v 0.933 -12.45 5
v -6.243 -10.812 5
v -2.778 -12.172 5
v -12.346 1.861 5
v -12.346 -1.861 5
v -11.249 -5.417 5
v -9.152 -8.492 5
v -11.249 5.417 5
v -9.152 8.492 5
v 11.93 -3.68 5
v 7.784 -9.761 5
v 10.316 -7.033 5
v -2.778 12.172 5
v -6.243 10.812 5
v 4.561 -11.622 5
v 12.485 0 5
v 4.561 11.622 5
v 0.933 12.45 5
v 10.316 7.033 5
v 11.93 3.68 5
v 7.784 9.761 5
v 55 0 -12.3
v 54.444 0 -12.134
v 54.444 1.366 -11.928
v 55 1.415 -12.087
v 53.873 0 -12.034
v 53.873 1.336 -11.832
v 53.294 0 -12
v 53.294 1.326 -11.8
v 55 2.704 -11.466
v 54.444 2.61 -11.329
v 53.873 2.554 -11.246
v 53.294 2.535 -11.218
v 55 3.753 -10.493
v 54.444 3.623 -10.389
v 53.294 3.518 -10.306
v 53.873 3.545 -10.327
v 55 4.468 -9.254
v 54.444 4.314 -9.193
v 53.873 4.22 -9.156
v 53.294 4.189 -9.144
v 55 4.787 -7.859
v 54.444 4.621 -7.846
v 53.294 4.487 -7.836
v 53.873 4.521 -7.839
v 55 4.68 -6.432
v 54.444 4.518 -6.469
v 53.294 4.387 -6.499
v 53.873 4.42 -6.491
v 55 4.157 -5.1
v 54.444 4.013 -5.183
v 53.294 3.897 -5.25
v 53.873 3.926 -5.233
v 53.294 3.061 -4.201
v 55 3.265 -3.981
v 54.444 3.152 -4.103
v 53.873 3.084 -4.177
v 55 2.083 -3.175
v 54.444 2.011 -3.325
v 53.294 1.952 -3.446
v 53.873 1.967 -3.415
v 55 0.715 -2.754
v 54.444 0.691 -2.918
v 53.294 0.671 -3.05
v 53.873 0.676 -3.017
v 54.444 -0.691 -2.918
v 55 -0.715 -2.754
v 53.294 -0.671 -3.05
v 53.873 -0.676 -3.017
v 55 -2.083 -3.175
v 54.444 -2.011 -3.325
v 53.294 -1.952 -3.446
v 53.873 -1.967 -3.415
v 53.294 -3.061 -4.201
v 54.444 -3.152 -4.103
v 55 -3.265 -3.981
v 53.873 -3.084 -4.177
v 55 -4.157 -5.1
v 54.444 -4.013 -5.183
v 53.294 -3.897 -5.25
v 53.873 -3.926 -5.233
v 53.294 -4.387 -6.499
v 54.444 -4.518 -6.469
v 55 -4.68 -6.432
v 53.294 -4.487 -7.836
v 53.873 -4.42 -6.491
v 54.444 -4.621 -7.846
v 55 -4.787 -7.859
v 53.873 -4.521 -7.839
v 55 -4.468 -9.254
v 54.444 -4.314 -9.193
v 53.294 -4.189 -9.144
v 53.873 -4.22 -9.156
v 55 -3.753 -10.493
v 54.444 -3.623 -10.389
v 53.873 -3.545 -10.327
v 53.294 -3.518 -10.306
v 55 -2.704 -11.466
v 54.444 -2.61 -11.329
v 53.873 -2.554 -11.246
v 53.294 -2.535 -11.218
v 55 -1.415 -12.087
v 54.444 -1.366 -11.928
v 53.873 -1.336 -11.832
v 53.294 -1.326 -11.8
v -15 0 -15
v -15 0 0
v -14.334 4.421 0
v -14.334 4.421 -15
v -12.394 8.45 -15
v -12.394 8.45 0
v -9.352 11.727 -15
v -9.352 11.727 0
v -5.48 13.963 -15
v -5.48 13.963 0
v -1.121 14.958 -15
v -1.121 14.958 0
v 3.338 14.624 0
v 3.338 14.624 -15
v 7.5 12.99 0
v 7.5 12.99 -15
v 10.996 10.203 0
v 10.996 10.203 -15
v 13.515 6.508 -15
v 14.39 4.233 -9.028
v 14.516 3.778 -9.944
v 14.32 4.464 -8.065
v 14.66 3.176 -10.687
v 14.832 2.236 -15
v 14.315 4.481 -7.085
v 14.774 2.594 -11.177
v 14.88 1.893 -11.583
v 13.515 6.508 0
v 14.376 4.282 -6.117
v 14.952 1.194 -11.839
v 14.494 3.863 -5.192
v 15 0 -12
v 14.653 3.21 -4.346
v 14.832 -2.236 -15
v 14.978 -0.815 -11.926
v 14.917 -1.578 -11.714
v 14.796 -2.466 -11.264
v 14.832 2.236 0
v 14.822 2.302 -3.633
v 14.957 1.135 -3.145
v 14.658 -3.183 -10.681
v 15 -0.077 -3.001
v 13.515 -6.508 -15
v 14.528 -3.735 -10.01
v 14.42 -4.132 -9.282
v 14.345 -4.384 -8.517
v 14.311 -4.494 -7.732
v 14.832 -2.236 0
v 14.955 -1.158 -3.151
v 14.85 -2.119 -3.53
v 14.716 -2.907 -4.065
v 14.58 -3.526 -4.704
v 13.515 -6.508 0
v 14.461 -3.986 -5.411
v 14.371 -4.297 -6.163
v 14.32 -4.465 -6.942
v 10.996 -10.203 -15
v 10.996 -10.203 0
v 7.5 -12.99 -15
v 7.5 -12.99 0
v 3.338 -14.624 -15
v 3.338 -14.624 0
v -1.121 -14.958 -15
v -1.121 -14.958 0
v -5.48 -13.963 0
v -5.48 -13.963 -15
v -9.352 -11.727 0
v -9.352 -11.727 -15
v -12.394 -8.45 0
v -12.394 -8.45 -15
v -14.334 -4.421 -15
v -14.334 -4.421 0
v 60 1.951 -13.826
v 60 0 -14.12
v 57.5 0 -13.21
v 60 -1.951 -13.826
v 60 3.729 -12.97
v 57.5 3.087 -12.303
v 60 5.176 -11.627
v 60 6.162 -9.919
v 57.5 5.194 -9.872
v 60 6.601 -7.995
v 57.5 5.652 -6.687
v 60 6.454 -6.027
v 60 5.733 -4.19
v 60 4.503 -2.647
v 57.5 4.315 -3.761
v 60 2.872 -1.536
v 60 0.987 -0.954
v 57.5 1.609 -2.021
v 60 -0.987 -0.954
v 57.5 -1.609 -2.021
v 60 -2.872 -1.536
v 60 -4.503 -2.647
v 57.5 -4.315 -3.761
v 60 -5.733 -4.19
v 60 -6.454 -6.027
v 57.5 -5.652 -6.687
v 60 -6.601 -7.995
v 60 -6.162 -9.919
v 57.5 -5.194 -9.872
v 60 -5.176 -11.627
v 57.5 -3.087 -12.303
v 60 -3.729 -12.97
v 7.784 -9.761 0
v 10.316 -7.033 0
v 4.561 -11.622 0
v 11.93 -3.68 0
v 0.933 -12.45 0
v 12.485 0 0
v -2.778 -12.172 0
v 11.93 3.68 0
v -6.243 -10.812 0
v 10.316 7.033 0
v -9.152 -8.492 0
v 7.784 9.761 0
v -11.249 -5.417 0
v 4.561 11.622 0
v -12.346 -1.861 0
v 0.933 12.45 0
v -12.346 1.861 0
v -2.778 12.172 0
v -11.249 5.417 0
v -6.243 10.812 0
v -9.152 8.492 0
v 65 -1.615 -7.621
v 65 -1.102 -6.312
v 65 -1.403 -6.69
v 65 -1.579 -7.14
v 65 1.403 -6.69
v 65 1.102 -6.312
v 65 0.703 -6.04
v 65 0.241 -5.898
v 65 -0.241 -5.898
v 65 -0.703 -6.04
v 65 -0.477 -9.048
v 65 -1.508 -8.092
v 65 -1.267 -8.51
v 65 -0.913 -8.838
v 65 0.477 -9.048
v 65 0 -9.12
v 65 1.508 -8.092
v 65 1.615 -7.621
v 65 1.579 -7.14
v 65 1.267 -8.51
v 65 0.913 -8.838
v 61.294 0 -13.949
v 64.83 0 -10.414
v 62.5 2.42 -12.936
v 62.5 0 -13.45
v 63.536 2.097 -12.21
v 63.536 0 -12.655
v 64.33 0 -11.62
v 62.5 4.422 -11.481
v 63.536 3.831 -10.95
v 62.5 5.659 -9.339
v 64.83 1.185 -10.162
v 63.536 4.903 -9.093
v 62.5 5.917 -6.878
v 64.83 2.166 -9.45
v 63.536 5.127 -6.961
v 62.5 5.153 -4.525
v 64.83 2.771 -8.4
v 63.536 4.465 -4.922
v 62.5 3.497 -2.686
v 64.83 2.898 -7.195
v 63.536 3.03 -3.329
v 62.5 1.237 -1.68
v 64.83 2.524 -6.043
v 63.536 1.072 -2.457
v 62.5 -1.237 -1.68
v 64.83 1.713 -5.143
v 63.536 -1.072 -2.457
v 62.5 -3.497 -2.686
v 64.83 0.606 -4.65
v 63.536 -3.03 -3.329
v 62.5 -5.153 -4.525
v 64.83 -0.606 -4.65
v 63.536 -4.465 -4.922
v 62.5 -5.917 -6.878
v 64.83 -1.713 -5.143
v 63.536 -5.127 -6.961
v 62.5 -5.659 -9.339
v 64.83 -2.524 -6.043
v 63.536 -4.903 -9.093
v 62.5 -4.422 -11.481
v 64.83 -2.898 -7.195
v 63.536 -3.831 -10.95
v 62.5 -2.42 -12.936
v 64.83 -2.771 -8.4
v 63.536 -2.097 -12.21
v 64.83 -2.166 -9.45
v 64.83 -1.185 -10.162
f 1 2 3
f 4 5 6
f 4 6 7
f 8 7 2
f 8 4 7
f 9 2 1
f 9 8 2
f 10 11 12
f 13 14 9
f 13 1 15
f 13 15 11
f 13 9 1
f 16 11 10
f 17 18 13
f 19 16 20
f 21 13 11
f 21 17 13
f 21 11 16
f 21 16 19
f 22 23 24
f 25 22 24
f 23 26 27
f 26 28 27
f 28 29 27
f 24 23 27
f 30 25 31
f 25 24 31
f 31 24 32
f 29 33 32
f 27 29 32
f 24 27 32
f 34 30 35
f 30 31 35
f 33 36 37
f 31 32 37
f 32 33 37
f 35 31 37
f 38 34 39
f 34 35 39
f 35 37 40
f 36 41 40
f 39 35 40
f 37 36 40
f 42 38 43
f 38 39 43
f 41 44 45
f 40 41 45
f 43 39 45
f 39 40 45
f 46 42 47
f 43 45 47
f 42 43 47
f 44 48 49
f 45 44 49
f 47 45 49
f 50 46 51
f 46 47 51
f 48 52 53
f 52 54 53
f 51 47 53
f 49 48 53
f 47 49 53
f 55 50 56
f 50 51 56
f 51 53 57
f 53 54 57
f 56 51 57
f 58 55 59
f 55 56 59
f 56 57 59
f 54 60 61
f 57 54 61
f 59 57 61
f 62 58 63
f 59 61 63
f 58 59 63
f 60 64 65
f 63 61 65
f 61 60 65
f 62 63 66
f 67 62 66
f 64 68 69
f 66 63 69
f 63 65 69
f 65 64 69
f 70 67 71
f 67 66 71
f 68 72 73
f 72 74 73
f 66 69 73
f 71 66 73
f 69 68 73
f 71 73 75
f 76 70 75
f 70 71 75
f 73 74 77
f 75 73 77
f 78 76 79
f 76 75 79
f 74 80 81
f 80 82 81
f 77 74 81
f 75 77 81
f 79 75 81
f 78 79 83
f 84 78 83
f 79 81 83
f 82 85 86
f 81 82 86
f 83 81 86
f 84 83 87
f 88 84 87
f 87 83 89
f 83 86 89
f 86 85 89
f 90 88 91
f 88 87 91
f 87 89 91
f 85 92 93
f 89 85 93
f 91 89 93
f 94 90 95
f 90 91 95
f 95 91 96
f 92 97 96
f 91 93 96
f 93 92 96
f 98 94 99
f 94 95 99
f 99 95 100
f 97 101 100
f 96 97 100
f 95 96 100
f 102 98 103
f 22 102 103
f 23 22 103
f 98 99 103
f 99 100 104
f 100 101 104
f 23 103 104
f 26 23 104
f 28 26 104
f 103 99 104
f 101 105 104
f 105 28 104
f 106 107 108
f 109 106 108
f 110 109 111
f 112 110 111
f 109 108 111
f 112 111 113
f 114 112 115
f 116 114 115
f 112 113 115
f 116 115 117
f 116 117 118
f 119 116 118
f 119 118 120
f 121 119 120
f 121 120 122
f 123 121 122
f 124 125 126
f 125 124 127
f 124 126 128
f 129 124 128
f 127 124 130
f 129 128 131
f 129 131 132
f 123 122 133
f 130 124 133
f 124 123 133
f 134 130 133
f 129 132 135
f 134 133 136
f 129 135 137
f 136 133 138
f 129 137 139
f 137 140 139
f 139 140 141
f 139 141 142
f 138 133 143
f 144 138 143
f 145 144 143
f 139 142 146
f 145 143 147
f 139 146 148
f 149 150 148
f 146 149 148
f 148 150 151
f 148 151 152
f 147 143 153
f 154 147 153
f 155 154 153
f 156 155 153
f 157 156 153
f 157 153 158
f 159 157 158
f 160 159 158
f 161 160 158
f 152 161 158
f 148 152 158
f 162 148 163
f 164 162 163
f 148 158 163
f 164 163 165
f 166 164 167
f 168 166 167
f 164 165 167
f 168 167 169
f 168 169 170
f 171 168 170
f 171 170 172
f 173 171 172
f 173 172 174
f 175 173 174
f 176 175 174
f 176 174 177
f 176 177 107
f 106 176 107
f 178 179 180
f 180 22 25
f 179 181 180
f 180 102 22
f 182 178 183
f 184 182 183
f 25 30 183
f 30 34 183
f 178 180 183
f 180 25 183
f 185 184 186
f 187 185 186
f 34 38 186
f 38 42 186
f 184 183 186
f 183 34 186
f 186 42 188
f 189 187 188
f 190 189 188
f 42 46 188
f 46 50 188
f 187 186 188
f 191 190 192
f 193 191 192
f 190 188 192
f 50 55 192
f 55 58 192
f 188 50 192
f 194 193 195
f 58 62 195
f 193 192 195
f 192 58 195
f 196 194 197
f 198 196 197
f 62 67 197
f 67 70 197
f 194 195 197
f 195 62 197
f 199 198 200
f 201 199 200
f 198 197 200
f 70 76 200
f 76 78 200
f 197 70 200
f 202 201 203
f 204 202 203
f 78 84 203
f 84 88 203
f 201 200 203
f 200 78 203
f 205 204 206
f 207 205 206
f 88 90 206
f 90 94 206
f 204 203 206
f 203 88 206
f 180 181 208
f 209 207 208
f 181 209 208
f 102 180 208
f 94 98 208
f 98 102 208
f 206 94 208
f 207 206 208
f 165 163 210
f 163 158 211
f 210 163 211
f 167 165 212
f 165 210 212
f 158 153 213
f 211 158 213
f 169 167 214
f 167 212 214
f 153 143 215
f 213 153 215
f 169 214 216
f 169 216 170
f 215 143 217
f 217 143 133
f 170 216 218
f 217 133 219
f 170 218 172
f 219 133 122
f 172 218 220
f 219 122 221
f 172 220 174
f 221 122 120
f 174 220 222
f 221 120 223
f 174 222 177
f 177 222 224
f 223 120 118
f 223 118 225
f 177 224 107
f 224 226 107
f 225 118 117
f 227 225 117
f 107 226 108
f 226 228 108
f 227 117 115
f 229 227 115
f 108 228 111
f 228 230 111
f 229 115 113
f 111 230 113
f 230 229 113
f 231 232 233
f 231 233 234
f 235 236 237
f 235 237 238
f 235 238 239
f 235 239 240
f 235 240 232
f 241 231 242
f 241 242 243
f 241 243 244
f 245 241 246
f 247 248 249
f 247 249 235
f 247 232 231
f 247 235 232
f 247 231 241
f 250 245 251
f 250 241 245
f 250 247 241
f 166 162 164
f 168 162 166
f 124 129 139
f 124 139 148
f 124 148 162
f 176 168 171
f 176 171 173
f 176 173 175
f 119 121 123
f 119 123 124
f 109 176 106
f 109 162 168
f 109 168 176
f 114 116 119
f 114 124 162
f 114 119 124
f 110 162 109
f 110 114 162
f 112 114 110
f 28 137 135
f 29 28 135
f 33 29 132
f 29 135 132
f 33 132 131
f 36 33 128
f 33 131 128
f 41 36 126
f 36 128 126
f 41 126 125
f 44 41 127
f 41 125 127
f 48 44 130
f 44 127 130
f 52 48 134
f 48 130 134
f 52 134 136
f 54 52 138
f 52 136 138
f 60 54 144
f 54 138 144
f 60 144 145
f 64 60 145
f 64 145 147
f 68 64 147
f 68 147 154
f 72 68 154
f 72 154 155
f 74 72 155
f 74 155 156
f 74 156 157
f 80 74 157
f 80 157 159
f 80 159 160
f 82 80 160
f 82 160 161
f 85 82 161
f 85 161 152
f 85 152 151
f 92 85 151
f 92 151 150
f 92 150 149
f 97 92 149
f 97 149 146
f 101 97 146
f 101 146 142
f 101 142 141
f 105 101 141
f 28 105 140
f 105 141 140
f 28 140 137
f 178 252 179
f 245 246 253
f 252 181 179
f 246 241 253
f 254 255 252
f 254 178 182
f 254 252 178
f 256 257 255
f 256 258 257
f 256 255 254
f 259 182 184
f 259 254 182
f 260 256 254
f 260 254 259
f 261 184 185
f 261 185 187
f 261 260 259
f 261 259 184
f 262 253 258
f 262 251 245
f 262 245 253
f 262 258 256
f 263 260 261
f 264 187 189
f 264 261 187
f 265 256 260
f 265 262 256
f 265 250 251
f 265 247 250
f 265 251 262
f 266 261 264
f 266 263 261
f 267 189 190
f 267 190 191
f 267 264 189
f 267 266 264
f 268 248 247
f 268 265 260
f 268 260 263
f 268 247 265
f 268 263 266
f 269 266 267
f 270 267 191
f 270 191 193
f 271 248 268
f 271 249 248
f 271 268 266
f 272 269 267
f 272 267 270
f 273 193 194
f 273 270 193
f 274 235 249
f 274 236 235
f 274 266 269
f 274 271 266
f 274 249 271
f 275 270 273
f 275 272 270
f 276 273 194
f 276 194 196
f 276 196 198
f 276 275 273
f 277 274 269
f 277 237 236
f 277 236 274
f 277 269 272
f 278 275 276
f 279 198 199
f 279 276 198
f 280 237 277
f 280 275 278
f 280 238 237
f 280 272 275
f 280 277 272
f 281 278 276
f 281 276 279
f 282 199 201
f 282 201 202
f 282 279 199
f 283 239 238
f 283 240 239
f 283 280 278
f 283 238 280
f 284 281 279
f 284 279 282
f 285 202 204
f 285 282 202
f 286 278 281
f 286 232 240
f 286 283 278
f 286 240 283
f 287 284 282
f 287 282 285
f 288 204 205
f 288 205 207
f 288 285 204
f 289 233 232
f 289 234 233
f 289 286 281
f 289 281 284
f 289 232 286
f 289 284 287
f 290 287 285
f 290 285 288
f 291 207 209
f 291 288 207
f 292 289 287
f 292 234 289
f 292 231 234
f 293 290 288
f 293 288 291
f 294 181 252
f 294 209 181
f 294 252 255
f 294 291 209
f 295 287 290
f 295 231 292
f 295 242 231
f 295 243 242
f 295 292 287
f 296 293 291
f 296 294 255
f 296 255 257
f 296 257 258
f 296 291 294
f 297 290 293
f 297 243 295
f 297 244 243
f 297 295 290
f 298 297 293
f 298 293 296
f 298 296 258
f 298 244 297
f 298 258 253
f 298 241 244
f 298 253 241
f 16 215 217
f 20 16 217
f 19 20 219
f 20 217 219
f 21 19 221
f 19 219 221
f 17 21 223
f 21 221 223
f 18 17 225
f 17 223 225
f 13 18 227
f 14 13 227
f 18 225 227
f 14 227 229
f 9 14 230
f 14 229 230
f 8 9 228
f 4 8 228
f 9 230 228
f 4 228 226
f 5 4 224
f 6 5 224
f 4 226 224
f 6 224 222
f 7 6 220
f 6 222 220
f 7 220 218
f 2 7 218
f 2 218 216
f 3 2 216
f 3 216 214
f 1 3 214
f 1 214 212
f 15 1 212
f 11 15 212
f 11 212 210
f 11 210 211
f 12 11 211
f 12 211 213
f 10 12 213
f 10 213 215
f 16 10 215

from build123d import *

# Parameters (mm, degrees)
SKETCH1_R           = 12.485
BOSS_EXTRUDE1_DEPTH = 20
SKETCH2_R           = 15
BOSS_EXTRUDE2_DEPTH = 15
SKETCH3_R           = 4.5
BOSS_EXTRUDE3_DEPTH = 55
SKETCH4_R           = 4.8
BOSS_EXTRUDE4_DEPTH = 5
BOSS_EXTRUDE4_DRAFT = -20
SKETCH5_R           = 6.619851171
BOSS_EXTRUDE6_DEPTH = 5
FILLET1_R           = 5
FILLET2_R           = 5
CUT_EXTRUDE2_START  = -15
SKETCH6_R           = 12.485
CUT_EXTRUDE2_DEPTH  = 15


# Some blends are built 0.0001 mm under size
with BuildPart() as part:
    # Sketch1 → Boss-Extrude1 (new body)
    with BuildSketch(Plane.XY):
        Circle(SKETCH1_R)
    extrude(amount=BOSS_EXTRUDE1_DEPTH)

    # Sketch2 → Boss-Extrude2 (add)
    with BuildSketch(Plane(origin=(0, 0, 0), x_dir=(-1, 0, 0), z_dir=(0, 0, -1))):
        Circle(SKETCH2_R)
    extrude(amount=BOSS_EXTRUDE2_DEPTH)

    # Sketch3 → Boss-Extrude3 (add)
    with BuildSketch(Plane(origin=(0, 0, 0), x_dir=(0, 0, -1), z_dir=(1, 0, 0))):
        with Locations((7.5, 0)):
            Circle(SKETCH3_R)
    extrude(amount=BOSS_EXTRUDE3_DEPTH)


with BuildPart() as boss_extrude4_tool:
    # Sketch4 → Boss-Extrude4 (with draft: the straight prism first)
    with BuildSketch(Plane(origin=(55, 0, 0), x_dir=(0, 0, -1), z_dir=(1, 0, 0))):
        with Locations((7.5, 0)):
            Circle(SKETCH4_R)
    extrude(amount=BOSS_EXTRUDE4_DEPTH)
    # Boss-Extrude4: the draft: its side faces are tilted about the plane it starts from
    boss_extrude4_sides = [boss_extrude4_tool.faces().sort_by_distance(p)[0] for p in [
        (57.5, 0, -2.7),
    ]]
    draft(boss_extrude4_sides, Plane(origin=(55, 0, 0), x_dir=(0, 0, -1), z_dir=(1, 0, 0)), BOSS_EXTRUDE4_DRAFT)


with BuildPart() as part_1:
    add(part.part)

    # Boss-Extrude4: add boss_extrude4_tool
    add(boss_extrude4_tool.part)

    # Sketch5 → Boss-Extrude6 (add)
    with BuildSketch(Plane(origin=(60, 0, 0), x_dir=(0, 0, -1), z_dir=(1, 0, 0))):
        with Locations((7.5, 0)):
            Circle(SKETCH5_R)
    extrude(amount=BOSS_EXTRUDE6_DEPTH)

    # Fillet1
    fillet1_edges = [part_1.edges().sort_by_distance(p)[0] for p in [
        (65, 0, -0.880148829),
    ]]
    fillet(fillet1_edges, radius=FILLET1_R - 0.0001)  # a hair under: the kernel refuses the full size

    # Fillet2
    # the kernel refuses this fillet: 5 mm, written as the material it adds along each edge
    with BuildSketch(Plane(origin=(55, 0, -7.5), x_dir=(0, 0, -1), z_dir=(0, -1, 0))) as fillet2_piece_1:
        with BuildLine():
            CenterArc((9.5, -1.705872211), FILLET2_R, 160.051556411, 19.948443589)
            Line((4.5, -1.705872211), (4.4, -1.705872211))
            Line((4.4, -1.705872211), (4.4, 0))
            Line((4.4, 0), (4.5, 0.1))
            ThreePointArc((4.5, 0.1), (4.65, 0.1), (4.706, 0.034117444))
            Line((4.706, 0.034117444), (4.8, 0))
        make_face()
    revolve(axis=Axis((55, 0, -7.5), (1, 0, 0)))

    # Sketch6 → Cut-Extrude2 (cut)
    with BuildSketch(Plane.XY.offset(20).offset(CUT_EXTRUDE2_START)):
        Circle(SKETCH6_R)
    extrude(amount=CUT_EXTRUDE2_DEPTH, mode=Mode.SUBTRACT)


solid = part_1.part
